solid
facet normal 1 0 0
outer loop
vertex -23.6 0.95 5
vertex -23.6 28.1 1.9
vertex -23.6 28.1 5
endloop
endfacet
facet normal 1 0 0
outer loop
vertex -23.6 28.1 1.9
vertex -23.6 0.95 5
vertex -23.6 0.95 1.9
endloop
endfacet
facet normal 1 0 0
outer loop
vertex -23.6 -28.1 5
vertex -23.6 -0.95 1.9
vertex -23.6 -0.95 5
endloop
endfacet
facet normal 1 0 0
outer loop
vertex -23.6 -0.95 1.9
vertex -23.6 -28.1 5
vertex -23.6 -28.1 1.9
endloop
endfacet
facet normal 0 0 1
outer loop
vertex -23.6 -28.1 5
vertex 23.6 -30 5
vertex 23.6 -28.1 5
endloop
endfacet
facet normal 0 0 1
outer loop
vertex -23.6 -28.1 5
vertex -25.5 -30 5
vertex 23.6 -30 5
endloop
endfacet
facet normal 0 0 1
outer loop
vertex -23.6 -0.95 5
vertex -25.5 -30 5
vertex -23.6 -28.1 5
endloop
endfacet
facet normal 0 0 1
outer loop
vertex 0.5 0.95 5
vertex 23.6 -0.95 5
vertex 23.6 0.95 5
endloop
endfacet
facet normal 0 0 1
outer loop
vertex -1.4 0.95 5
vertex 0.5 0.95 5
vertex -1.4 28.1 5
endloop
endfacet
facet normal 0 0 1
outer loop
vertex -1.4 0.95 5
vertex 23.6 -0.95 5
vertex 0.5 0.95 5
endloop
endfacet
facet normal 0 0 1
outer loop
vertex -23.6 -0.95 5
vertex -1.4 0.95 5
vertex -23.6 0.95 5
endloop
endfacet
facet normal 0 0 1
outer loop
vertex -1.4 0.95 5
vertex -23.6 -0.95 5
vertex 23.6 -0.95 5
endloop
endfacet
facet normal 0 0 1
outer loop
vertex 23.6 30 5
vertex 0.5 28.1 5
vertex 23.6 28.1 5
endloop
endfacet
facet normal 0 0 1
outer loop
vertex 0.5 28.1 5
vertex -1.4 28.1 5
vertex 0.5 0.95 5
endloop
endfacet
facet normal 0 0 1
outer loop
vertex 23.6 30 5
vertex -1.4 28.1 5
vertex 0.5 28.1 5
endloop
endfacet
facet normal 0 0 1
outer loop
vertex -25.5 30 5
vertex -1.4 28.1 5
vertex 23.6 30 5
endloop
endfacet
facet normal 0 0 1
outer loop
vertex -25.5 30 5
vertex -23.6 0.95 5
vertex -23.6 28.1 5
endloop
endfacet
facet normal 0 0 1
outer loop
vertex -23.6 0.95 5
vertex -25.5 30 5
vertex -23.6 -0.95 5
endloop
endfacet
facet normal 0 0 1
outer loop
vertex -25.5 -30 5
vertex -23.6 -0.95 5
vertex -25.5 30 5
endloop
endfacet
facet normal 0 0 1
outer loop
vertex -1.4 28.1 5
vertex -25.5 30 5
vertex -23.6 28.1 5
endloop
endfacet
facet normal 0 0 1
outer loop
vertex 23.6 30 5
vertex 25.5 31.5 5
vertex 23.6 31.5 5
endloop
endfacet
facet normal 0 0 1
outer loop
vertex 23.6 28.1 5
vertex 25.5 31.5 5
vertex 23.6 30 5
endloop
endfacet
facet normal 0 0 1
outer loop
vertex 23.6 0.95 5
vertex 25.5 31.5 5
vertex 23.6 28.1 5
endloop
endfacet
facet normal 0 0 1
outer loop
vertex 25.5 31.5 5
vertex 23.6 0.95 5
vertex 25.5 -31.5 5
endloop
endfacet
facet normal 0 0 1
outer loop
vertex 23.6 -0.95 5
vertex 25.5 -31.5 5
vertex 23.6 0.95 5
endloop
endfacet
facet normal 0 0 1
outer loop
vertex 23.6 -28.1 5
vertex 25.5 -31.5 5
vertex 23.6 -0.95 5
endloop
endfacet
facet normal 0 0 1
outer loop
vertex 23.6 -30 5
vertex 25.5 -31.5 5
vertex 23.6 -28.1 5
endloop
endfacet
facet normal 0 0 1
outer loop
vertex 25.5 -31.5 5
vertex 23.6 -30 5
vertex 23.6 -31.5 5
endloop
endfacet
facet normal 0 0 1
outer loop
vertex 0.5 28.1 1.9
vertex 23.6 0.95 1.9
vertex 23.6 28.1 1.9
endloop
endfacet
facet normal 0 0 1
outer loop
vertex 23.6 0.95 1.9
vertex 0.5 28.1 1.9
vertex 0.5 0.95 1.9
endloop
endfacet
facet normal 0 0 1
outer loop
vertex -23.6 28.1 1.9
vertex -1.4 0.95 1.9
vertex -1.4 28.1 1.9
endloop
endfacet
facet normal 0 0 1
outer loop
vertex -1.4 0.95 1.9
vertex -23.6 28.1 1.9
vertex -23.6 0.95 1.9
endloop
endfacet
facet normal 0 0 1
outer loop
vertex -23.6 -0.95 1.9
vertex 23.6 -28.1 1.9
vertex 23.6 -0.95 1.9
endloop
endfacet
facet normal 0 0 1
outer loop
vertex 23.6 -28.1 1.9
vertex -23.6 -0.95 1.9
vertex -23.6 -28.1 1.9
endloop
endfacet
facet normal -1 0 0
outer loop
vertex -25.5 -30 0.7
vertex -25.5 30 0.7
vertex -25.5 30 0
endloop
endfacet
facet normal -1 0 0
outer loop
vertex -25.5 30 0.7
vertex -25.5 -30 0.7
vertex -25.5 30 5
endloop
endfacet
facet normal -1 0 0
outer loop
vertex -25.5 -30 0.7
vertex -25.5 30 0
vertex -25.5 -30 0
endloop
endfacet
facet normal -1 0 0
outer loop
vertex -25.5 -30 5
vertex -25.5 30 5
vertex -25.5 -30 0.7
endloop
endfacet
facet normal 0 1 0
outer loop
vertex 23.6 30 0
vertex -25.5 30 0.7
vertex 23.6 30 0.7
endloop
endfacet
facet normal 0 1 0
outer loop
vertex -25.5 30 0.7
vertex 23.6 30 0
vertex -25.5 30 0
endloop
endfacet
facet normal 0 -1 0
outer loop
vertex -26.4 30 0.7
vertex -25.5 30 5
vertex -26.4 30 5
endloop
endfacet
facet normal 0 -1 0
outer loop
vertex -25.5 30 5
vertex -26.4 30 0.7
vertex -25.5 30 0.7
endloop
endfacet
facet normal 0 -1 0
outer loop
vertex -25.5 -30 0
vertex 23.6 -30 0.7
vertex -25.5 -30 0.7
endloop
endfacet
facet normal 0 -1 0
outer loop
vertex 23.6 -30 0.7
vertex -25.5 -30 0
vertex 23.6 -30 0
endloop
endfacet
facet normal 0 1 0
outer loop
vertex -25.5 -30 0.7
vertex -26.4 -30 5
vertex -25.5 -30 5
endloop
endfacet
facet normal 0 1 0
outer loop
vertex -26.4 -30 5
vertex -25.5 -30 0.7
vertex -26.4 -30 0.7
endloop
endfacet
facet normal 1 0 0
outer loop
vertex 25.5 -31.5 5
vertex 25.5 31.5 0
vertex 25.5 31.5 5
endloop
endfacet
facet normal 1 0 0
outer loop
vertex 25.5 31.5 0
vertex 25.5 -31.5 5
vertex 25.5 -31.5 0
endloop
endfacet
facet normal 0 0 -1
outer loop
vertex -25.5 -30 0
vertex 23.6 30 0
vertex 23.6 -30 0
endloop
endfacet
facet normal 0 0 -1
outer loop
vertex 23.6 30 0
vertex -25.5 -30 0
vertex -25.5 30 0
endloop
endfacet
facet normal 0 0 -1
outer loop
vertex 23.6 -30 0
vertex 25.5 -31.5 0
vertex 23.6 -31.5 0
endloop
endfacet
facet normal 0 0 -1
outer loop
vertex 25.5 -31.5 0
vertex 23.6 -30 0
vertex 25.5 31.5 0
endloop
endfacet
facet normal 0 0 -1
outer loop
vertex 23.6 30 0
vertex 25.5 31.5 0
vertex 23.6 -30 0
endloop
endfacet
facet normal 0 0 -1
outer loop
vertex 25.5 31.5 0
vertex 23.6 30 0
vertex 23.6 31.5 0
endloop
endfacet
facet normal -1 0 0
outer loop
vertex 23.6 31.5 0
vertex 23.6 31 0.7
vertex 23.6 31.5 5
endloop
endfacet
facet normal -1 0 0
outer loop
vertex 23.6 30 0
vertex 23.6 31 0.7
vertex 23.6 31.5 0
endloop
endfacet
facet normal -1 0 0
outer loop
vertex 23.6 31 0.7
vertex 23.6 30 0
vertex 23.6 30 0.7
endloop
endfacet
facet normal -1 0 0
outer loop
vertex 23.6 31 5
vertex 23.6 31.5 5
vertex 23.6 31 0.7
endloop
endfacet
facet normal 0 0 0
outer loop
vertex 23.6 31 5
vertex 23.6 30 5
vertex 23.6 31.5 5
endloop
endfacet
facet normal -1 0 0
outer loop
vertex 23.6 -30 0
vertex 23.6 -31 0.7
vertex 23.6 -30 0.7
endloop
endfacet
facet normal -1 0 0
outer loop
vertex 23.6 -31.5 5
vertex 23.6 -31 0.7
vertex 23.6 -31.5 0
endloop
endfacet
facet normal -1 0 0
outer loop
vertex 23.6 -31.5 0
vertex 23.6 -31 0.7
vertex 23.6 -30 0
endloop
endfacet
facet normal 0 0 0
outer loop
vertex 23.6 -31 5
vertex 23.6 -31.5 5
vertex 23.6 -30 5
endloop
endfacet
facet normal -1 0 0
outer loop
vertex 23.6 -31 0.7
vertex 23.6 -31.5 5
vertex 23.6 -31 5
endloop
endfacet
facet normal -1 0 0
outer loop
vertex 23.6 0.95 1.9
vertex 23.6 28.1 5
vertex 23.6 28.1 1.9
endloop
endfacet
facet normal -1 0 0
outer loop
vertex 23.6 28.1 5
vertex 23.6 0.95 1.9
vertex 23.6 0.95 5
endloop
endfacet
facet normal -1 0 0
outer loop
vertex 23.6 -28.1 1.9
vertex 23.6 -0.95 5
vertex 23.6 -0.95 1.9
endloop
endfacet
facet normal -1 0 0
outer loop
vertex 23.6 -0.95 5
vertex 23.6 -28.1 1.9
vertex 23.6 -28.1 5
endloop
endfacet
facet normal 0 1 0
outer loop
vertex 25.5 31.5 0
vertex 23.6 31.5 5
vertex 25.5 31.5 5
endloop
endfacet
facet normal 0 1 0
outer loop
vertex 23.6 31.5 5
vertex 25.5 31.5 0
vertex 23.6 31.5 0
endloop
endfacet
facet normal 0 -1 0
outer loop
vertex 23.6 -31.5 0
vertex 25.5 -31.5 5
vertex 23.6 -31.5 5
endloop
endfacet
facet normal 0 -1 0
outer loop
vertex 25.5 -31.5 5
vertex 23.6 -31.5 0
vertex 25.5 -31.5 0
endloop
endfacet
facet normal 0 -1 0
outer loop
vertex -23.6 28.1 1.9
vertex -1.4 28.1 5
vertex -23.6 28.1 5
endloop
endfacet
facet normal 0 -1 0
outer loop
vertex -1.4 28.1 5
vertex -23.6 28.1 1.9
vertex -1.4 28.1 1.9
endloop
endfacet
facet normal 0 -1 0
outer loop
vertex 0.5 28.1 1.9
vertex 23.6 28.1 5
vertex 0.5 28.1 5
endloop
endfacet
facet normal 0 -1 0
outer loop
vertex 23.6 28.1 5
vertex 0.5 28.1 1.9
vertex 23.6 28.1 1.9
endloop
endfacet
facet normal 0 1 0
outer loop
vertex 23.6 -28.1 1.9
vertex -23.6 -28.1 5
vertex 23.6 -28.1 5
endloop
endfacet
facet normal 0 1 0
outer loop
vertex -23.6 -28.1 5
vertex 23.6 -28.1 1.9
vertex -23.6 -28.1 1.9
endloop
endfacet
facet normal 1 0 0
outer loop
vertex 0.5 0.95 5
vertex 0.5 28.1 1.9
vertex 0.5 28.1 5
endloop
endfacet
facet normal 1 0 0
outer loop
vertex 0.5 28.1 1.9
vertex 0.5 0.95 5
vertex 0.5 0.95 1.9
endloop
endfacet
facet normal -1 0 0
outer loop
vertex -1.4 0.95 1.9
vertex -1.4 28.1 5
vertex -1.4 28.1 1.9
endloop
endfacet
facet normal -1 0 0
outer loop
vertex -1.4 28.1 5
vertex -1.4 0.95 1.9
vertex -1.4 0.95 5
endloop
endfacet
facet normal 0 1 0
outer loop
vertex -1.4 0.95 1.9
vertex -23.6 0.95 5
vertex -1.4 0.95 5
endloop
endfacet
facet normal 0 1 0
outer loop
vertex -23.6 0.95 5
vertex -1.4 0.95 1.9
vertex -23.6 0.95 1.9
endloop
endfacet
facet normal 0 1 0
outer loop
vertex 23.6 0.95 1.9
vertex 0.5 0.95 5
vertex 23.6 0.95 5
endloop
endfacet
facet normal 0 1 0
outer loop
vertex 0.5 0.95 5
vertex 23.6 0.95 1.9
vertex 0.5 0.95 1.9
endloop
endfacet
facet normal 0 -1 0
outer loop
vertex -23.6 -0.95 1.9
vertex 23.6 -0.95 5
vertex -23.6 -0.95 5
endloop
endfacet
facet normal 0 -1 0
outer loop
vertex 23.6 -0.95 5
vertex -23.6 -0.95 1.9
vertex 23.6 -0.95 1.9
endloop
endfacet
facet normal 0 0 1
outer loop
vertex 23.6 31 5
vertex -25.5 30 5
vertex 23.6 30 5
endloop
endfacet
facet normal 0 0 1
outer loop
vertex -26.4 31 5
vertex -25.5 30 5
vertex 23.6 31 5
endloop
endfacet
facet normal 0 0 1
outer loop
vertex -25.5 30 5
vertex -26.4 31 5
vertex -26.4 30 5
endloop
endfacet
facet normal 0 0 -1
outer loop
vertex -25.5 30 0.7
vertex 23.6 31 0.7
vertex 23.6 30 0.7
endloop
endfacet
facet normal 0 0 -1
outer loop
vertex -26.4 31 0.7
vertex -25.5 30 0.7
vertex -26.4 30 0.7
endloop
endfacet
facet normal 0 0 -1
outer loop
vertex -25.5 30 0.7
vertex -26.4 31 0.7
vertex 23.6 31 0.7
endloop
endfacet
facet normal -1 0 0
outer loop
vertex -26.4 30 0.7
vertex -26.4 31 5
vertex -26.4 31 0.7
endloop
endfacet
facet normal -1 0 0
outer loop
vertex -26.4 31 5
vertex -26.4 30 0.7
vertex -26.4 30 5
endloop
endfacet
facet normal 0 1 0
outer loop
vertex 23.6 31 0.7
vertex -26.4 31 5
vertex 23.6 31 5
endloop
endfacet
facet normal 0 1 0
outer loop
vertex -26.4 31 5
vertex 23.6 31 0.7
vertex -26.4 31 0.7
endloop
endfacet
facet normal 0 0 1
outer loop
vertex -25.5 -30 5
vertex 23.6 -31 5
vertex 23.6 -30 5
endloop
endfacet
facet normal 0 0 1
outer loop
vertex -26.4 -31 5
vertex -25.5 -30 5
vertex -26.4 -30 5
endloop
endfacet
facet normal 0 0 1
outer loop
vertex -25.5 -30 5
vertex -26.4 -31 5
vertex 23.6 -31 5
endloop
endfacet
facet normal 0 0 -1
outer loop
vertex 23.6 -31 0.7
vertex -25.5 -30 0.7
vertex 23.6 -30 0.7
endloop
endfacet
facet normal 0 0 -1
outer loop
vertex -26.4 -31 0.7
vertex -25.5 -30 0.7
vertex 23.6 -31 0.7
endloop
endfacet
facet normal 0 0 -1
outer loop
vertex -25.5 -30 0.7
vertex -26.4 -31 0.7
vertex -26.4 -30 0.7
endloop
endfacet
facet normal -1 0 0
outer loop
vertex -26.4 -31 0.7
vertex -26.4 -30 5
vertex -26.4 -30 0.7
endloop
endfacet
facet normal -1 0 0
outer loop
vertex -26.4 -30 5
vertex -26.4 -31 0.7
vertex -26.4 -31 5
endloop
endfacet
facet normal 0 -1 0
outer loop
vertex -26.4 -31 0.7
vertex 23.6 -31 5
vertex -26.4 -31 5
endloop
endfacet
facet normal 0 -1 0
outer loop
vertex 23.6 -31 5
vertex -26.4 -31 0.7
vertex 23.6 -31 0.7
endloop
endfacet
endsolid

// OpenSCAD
// file: ../hdim.scad
module hdim(x1 = 10, x2 = 20, y = 10, dimline_lenght = 9.0) 
{
    dimline_overlap = 0.5;
    dimline_width = 0.3;
    text_size = 2;
    tmp = 2*dimline_overlap+text_size/2;
    text_pos = dimline_lenght>0 ? tmp : -tmp; 
    dimline_abs = dimline_lenght>0 ? dimline_lenght : -dimline_lenght;
    
    color([0,0,0])
    {
        translate([x1,y-dimline_lenght/2,0]) 
            square([dimline_width, 
                dimline_abs + 2*dimline_overlap], 
                center=true, $fs=0.01);
                
        translate([x2,y-dimline_lenght/2,0]) 
            square([dimline_width, 
                dimline_abs + 2*dimline_overlap], 
                center=true, $fs=0.01);

        translate([(x1+x2)/2,y-dimline_lenght,0]) 
            square([x2-x1, 
                dimline_width], 
                center=true, $fs=0.01);
    }
        
    translate([(x1+x2)/2,y-dimline_lenght-text_pos,0]) 
    {
        color([0,0,0])
        cube([text_size * 5, 1.2*text_size, 0.9], center=true);
        
        color([0.8,0.8,0.5,1.0])
        {
            translate([0,0,0.2])
            text(str(0.1*round((x2-x1)*10)), size = text_size, 
                halign = "center",valign = "center");
            translate([0,0,-0.2])
            rotate([0,180,0])
            text(str(0.1*round((x2-x1)*10)), size = text_size, 
                halign = "center",valign = "center");
        }
    }
}

hdim();
// main file
use <../hdim.scad> 

box_l = 51; // Depth max 54
box_w = 60; 
box_h = 5;
plywood_t = 1.9;

slider_t = 1; // thickness
slider_w = 4.3; // width
slider_l = 50; // length
slider_m = slider_l; // movement

module workatabledrawer(open = false)
{
  explode = false;
  final_view = false;
  
  edelta = explode ? 12 : 0;
  opaque10 = final_view ? 0 : 0.1;
    
  translate([open?slider_m:0,0,0])
  {  
    color([51/255, 34/255, 6/255, 1-opaque10]) 
    translate([-plywood_t/2,0,plywood_t/2])
    cube([box_l-plywood_t, box_w, plywood_t], center=true);
    
    if (!final_view) {
        hdim(-box_l/2, box_l/2-plywood_t, box_w/2, -2);
        rotate([0,0,90]) 
        hdim(-box_w/2, box_w/2, box_l/2, -5);
    }

    cover_over = 1.5;
    
    color([71/255, 44/255, 16/255, 1-2*opaque10]) {
        translate([-box_l/2+plywood_t/2-edelta,0,box_h/2+plywood_t/2])
        cube([plywood_t, box_w, box_h-plywood_t],
            center=true);
        
        translate([box_l/2-plywood_t/2+edelta,0,box_h/2])
        cube([plywood_t, box_w+2*cover_over, box_h],
            center=true); 
    }

    dim1 = (box_l - 2*plywood_t)/2;
    dim2 = (box_h - plywood_t)/2;
    dim3 = box_h/2;

    if (!final_view) {
        translate([0, -edelta, box_h/2+plywood_t/2]) 
        rotate([0,0,180]) 
        hdim(-dim1, dim1, box_w/2, -5);
        
        translate([0, -edelta-box_w/2+plywood_t/2,
            box_h/2+plywood_t/2]) 
        rotate([0,90,90]) 
        hdim(-dim2, dim2, -dim1, 5);
    }
    
    color([91/255, 78/255, 66/255, 1-2*opaque10]) {
        translate([0,box_w/2-plywood_t/2+edelta,
            box_h/2+plywood_t/2])
        cube([box_l - 2*plywood_t, plywood_t,
            box_h-plywood_t], center=true);
        
        translate([0,-box_w/2+plywood_t/2-edelta,
            box_h/2+plywood_t/2])
        cube([box_l - 2*plywood_t, plywood_t, 
            box_h-plywood_t], center=true);
    }
    
    if (!final_view) {
        translate([0,0,box_h/2+plywood_t/2])
        rotate([0,0,90]) 
        hdim(-box_w/2-cover_over, 
            box_w/2+cover_over, 
            -box_l/2-edelta, 7); 
        
        translate([edelta+box_l/2-plywood_t/2,
        0, box_h/2]) 
        rotate([0,90,-90]) hdim(-dim3, dim3, 0, -4);
    }
 
    main_divider_pos = 25;
    color([71/255, 44/255, 16/255, 1-2*opaque10]) 
    {
        ww = box_w/2 - 1.5 * plywood_t;
      translate([box_l/2 - plywood_t/2
        + edelta - main_divider_pos,
        ww/2+plywood_t/2,box_h/2+plywood_t/2])
      cube([plywood_t, ww, 
        box_h-plywood_t], center=true);
            
      translate([0,0,
            box_h/2+plywood_t/2])
      cube([box_l - 2*plywood_t, plywood_t, 
            box_h-plywood_t], center=true);

      }
    
    translate([-slider_l + box_l/2 - plywood_t, 
        box_w/2, box_h-slider_w]) 
    slider(open);
    
    translate([-slider_l + box_l/2 - plywood_t, 
        -box_w/2, box_h-slider_w]) 
    mirror([0,1,0]) 
    slider(open);
  }
}        

module slider(open = false)
{
    color([122/255, 162/255, 214/255, 1]) 
    cube([slider_l, slider_t/2, slider_w], center = false);

    translate([open?-slider_m:0,slider_t/2,0])
    color([192/255, 192/255, 255/255, 1]) 
    cube([slider_l, slider_t/2, slider_w], center = false);}



workatabledrawer();
